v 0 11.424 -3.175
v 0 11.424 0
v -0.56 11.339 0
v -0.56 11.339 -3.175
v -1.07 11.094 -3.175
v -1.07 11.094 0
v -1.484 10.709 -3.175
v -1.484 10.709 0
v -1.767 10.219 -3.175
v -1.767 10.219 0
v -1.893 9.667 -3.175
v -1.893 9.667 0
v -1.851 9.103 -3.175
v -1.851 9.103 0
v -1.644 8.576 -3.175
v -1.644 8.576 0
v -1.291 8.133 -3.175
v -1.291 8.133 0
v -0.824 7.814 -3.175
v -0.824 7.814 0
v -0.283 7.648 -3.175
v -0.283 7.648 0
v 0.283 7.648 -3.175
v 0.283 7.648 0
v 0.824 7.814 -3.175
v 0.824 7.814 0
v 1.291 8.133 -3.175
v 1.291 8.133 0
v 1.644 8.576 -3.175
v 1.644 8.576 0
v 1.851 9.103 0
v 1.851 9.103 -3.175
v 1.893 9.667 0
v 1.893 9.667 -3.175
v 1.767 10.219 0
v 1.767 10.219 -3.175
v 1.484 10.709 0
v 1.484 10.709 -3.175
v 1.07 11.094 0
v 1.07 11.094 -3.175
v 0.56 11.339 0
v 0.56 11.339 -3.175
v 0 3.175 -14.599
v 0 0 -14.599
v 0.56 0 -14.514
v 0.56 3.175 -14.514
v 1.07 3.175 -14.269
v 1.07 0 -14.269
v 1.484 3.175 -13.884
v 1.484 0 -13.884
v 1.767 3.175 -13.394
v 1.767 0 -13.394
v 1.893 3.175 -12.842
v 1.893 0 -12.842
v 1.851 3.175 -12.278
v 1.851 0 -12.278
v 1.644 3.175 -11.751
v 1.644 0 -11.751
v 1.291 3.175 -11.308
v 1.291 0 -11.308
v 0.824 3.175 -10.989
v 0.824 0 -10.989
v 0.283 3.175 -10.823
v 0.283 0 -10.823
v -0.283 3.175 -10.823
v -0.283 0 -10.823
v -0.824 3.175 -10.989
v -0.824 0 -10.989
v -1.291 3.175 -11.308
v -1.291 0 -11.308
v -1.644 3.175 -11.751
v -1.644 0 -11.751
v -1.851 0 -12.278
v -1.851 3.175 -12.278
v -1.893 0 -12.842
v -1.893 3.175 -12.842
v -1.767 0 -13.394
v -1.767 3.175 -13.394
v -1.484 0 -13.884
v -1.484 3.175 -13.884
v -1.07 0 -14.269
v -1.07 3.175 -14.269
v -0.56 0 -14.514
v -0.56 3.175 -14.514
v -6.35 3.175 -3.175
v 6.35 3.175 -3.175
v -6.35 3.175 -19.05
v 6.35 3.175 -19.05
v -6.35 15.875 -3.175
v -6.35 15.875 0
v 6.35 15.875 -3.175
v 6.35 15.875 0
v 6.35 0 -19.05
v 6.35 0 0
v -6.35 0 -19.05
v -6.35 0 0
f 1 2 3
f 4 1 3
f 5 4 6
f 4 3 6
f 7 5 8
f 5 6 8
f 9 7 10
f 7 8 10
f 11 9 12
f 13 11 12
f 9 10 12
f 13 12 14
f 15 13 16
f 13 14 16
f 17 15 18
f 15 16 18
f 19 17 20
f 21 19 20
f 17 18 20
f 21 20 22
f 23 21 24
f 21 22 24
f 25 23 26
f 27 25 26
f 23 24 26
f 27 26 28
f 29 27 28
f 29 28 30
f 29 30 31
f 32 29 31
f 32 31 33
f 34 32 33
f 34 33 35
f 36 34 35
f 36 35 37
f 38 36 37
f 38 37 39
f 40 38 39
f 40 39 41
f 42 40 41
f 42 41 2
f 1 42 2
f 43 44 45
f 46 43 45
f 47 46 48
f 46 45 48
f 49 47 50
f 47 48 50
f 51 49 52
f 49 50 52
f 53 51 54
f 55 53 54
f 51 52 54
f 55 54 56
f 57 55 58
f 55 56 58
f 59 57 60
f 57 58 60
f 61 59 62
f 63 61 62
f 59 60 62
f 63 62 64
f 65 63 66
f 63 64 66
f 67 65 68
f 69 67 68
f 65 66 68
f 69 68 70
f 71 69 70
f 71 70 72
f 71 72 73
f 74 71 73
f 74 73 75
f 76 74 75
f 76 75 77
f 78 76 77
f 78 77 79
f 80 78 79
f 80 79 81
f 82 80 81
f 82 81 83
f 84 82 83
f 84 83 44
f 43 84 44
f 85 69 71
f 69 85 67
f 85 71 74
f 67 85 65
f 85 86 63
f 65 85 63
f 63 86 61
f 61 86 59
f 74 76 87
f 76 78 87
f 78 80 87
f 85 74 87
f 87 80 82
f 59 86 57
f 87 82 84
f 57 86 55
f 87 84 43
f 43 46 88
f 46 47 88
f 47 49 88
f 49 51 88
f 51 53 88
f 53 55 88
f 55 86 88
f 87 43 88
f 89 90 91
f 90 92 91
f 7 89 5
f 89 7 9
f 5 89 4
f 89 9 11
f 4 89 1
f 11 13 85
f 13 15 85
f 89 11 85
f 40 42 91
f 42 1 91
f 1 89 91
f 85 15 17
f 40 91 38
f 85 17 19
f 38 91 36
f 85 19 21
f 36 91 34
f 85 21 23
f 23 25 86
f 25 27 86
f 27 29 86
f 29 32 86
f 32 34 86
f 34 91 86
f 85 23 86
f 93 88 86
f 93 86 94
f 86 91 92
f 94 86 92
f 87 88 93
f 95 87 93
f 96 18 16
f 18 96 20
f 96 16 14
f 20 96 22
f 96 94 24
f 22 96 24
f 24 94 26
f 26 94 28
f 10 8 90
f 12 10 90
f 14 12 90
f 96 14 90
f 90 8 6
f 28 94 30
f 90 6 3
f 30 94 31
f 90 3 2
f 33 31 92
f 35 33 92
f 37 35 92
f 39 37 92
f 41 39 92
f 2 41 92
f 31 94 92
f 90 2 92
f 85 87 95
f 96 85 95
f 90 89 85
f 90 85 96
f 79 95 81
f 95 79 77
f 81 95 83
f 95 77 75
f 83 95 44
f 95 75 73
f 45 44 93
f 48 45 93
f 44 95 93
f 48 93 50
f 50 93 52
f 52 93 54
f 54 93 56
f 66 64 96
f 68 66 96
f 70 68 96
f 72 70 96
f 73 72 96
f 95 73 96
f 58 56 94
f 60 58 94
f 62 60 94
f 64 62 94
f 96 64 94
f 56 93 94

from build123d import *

# Parameters (mm, degrees)
EXTRUDE1_DEPTH                      = 6.35
EXTRUDE1_DEPTH_BACK                 = 6.35
F_6_CLEARANCE_HOLE1_D               = 3.7973
F_6_CLEARANCE_HOLE1_DEPTH           = 12.7
F_6_CLEARANCE_HOLE1_TIP             = 1.140824014
F_6_CLEARANCE_HOLE1_ON_FACE_2_D     = 3.7973
F_6_CLEARANCE_HOLE1_ON_FACE_2_DEPTH = 12.7
F_6_CLEARANCE_HOLE1_ON_FACE_2_TIP   = 1.140824014


with BuildPart() as part:
    # Sketch2 → Extrude1 (new, two sides: drawn at the far end of the back side and taken through both)
    with BuildSketch(Plane(origin=(0, 0, 0), x_dir=(0, 0, -1), z_dir=(1, 0, 0)).offset(-EXTRUDE1_DEPTH_BACK)):
        Polygon((0, 0), (0, 15.875), (3.175, 15.875), (3.175, 3.175), (19.05, 3.175), (19.05, 0), align=None)
    extrude(amount=EXTRUDE1_DEPTH + EXTRUDE1_DEPTH_BACK)

    # #6 Clearance Hole1
    with Locations(Plane(origin=(0, 9.525, -3.175), x_dir=(0, -1, 0), z_dir=(0, 0, -1))):
        with Locations((0, 0)):
            Hole(F_6_CLEARANCE_HOLE1_D / 2, depth=F_6_CLEARANCE_HOLE1_DEPTH)
            with Locations((0, 0, -(F_6_CLEARANCE_HOLE1_DEPTH + F_6_CLEARANCE_HOLE1_TIP / 2))):  # 118° drill point
                Cone(0, F_6_CLEARANCE_HOLE1_D / 2, F_6_CLEARANCE_HOLE1_TIP, mode=Mode.SUBTRACT)

    # #6 Clearance Hole1 on face 2
    with Locations(Plane(origin=(0, 3.175, -12.7), x_dir=(0, 0, 1), z_dir=(0, 1, 0))):
        with Locations((0, 0)):
            Hole(F_6_CLEARANCE_HOLE1_ON_FACE_2_D / 2, depth=F_6_CLEARANCE_HOLE1_ON_FACE_2_DEPTH)
            with Locations((0, 0, -(F_6_CLEARANCE_HOLE1_ON_FACE_2_DEPTH + F_6_CLEARANCE_HOLE1_ON_FACE_2_TIP / 2))):  # 118° drill point
                Cone(0, F_6_CLEARANCE_HOLE1_ON_FACE_2_D / 2, F_6_CLEARANCE_HOLE1_ON_FACE_2_TIP, mode=Mode.SUBTRACT)


solid = part.part
